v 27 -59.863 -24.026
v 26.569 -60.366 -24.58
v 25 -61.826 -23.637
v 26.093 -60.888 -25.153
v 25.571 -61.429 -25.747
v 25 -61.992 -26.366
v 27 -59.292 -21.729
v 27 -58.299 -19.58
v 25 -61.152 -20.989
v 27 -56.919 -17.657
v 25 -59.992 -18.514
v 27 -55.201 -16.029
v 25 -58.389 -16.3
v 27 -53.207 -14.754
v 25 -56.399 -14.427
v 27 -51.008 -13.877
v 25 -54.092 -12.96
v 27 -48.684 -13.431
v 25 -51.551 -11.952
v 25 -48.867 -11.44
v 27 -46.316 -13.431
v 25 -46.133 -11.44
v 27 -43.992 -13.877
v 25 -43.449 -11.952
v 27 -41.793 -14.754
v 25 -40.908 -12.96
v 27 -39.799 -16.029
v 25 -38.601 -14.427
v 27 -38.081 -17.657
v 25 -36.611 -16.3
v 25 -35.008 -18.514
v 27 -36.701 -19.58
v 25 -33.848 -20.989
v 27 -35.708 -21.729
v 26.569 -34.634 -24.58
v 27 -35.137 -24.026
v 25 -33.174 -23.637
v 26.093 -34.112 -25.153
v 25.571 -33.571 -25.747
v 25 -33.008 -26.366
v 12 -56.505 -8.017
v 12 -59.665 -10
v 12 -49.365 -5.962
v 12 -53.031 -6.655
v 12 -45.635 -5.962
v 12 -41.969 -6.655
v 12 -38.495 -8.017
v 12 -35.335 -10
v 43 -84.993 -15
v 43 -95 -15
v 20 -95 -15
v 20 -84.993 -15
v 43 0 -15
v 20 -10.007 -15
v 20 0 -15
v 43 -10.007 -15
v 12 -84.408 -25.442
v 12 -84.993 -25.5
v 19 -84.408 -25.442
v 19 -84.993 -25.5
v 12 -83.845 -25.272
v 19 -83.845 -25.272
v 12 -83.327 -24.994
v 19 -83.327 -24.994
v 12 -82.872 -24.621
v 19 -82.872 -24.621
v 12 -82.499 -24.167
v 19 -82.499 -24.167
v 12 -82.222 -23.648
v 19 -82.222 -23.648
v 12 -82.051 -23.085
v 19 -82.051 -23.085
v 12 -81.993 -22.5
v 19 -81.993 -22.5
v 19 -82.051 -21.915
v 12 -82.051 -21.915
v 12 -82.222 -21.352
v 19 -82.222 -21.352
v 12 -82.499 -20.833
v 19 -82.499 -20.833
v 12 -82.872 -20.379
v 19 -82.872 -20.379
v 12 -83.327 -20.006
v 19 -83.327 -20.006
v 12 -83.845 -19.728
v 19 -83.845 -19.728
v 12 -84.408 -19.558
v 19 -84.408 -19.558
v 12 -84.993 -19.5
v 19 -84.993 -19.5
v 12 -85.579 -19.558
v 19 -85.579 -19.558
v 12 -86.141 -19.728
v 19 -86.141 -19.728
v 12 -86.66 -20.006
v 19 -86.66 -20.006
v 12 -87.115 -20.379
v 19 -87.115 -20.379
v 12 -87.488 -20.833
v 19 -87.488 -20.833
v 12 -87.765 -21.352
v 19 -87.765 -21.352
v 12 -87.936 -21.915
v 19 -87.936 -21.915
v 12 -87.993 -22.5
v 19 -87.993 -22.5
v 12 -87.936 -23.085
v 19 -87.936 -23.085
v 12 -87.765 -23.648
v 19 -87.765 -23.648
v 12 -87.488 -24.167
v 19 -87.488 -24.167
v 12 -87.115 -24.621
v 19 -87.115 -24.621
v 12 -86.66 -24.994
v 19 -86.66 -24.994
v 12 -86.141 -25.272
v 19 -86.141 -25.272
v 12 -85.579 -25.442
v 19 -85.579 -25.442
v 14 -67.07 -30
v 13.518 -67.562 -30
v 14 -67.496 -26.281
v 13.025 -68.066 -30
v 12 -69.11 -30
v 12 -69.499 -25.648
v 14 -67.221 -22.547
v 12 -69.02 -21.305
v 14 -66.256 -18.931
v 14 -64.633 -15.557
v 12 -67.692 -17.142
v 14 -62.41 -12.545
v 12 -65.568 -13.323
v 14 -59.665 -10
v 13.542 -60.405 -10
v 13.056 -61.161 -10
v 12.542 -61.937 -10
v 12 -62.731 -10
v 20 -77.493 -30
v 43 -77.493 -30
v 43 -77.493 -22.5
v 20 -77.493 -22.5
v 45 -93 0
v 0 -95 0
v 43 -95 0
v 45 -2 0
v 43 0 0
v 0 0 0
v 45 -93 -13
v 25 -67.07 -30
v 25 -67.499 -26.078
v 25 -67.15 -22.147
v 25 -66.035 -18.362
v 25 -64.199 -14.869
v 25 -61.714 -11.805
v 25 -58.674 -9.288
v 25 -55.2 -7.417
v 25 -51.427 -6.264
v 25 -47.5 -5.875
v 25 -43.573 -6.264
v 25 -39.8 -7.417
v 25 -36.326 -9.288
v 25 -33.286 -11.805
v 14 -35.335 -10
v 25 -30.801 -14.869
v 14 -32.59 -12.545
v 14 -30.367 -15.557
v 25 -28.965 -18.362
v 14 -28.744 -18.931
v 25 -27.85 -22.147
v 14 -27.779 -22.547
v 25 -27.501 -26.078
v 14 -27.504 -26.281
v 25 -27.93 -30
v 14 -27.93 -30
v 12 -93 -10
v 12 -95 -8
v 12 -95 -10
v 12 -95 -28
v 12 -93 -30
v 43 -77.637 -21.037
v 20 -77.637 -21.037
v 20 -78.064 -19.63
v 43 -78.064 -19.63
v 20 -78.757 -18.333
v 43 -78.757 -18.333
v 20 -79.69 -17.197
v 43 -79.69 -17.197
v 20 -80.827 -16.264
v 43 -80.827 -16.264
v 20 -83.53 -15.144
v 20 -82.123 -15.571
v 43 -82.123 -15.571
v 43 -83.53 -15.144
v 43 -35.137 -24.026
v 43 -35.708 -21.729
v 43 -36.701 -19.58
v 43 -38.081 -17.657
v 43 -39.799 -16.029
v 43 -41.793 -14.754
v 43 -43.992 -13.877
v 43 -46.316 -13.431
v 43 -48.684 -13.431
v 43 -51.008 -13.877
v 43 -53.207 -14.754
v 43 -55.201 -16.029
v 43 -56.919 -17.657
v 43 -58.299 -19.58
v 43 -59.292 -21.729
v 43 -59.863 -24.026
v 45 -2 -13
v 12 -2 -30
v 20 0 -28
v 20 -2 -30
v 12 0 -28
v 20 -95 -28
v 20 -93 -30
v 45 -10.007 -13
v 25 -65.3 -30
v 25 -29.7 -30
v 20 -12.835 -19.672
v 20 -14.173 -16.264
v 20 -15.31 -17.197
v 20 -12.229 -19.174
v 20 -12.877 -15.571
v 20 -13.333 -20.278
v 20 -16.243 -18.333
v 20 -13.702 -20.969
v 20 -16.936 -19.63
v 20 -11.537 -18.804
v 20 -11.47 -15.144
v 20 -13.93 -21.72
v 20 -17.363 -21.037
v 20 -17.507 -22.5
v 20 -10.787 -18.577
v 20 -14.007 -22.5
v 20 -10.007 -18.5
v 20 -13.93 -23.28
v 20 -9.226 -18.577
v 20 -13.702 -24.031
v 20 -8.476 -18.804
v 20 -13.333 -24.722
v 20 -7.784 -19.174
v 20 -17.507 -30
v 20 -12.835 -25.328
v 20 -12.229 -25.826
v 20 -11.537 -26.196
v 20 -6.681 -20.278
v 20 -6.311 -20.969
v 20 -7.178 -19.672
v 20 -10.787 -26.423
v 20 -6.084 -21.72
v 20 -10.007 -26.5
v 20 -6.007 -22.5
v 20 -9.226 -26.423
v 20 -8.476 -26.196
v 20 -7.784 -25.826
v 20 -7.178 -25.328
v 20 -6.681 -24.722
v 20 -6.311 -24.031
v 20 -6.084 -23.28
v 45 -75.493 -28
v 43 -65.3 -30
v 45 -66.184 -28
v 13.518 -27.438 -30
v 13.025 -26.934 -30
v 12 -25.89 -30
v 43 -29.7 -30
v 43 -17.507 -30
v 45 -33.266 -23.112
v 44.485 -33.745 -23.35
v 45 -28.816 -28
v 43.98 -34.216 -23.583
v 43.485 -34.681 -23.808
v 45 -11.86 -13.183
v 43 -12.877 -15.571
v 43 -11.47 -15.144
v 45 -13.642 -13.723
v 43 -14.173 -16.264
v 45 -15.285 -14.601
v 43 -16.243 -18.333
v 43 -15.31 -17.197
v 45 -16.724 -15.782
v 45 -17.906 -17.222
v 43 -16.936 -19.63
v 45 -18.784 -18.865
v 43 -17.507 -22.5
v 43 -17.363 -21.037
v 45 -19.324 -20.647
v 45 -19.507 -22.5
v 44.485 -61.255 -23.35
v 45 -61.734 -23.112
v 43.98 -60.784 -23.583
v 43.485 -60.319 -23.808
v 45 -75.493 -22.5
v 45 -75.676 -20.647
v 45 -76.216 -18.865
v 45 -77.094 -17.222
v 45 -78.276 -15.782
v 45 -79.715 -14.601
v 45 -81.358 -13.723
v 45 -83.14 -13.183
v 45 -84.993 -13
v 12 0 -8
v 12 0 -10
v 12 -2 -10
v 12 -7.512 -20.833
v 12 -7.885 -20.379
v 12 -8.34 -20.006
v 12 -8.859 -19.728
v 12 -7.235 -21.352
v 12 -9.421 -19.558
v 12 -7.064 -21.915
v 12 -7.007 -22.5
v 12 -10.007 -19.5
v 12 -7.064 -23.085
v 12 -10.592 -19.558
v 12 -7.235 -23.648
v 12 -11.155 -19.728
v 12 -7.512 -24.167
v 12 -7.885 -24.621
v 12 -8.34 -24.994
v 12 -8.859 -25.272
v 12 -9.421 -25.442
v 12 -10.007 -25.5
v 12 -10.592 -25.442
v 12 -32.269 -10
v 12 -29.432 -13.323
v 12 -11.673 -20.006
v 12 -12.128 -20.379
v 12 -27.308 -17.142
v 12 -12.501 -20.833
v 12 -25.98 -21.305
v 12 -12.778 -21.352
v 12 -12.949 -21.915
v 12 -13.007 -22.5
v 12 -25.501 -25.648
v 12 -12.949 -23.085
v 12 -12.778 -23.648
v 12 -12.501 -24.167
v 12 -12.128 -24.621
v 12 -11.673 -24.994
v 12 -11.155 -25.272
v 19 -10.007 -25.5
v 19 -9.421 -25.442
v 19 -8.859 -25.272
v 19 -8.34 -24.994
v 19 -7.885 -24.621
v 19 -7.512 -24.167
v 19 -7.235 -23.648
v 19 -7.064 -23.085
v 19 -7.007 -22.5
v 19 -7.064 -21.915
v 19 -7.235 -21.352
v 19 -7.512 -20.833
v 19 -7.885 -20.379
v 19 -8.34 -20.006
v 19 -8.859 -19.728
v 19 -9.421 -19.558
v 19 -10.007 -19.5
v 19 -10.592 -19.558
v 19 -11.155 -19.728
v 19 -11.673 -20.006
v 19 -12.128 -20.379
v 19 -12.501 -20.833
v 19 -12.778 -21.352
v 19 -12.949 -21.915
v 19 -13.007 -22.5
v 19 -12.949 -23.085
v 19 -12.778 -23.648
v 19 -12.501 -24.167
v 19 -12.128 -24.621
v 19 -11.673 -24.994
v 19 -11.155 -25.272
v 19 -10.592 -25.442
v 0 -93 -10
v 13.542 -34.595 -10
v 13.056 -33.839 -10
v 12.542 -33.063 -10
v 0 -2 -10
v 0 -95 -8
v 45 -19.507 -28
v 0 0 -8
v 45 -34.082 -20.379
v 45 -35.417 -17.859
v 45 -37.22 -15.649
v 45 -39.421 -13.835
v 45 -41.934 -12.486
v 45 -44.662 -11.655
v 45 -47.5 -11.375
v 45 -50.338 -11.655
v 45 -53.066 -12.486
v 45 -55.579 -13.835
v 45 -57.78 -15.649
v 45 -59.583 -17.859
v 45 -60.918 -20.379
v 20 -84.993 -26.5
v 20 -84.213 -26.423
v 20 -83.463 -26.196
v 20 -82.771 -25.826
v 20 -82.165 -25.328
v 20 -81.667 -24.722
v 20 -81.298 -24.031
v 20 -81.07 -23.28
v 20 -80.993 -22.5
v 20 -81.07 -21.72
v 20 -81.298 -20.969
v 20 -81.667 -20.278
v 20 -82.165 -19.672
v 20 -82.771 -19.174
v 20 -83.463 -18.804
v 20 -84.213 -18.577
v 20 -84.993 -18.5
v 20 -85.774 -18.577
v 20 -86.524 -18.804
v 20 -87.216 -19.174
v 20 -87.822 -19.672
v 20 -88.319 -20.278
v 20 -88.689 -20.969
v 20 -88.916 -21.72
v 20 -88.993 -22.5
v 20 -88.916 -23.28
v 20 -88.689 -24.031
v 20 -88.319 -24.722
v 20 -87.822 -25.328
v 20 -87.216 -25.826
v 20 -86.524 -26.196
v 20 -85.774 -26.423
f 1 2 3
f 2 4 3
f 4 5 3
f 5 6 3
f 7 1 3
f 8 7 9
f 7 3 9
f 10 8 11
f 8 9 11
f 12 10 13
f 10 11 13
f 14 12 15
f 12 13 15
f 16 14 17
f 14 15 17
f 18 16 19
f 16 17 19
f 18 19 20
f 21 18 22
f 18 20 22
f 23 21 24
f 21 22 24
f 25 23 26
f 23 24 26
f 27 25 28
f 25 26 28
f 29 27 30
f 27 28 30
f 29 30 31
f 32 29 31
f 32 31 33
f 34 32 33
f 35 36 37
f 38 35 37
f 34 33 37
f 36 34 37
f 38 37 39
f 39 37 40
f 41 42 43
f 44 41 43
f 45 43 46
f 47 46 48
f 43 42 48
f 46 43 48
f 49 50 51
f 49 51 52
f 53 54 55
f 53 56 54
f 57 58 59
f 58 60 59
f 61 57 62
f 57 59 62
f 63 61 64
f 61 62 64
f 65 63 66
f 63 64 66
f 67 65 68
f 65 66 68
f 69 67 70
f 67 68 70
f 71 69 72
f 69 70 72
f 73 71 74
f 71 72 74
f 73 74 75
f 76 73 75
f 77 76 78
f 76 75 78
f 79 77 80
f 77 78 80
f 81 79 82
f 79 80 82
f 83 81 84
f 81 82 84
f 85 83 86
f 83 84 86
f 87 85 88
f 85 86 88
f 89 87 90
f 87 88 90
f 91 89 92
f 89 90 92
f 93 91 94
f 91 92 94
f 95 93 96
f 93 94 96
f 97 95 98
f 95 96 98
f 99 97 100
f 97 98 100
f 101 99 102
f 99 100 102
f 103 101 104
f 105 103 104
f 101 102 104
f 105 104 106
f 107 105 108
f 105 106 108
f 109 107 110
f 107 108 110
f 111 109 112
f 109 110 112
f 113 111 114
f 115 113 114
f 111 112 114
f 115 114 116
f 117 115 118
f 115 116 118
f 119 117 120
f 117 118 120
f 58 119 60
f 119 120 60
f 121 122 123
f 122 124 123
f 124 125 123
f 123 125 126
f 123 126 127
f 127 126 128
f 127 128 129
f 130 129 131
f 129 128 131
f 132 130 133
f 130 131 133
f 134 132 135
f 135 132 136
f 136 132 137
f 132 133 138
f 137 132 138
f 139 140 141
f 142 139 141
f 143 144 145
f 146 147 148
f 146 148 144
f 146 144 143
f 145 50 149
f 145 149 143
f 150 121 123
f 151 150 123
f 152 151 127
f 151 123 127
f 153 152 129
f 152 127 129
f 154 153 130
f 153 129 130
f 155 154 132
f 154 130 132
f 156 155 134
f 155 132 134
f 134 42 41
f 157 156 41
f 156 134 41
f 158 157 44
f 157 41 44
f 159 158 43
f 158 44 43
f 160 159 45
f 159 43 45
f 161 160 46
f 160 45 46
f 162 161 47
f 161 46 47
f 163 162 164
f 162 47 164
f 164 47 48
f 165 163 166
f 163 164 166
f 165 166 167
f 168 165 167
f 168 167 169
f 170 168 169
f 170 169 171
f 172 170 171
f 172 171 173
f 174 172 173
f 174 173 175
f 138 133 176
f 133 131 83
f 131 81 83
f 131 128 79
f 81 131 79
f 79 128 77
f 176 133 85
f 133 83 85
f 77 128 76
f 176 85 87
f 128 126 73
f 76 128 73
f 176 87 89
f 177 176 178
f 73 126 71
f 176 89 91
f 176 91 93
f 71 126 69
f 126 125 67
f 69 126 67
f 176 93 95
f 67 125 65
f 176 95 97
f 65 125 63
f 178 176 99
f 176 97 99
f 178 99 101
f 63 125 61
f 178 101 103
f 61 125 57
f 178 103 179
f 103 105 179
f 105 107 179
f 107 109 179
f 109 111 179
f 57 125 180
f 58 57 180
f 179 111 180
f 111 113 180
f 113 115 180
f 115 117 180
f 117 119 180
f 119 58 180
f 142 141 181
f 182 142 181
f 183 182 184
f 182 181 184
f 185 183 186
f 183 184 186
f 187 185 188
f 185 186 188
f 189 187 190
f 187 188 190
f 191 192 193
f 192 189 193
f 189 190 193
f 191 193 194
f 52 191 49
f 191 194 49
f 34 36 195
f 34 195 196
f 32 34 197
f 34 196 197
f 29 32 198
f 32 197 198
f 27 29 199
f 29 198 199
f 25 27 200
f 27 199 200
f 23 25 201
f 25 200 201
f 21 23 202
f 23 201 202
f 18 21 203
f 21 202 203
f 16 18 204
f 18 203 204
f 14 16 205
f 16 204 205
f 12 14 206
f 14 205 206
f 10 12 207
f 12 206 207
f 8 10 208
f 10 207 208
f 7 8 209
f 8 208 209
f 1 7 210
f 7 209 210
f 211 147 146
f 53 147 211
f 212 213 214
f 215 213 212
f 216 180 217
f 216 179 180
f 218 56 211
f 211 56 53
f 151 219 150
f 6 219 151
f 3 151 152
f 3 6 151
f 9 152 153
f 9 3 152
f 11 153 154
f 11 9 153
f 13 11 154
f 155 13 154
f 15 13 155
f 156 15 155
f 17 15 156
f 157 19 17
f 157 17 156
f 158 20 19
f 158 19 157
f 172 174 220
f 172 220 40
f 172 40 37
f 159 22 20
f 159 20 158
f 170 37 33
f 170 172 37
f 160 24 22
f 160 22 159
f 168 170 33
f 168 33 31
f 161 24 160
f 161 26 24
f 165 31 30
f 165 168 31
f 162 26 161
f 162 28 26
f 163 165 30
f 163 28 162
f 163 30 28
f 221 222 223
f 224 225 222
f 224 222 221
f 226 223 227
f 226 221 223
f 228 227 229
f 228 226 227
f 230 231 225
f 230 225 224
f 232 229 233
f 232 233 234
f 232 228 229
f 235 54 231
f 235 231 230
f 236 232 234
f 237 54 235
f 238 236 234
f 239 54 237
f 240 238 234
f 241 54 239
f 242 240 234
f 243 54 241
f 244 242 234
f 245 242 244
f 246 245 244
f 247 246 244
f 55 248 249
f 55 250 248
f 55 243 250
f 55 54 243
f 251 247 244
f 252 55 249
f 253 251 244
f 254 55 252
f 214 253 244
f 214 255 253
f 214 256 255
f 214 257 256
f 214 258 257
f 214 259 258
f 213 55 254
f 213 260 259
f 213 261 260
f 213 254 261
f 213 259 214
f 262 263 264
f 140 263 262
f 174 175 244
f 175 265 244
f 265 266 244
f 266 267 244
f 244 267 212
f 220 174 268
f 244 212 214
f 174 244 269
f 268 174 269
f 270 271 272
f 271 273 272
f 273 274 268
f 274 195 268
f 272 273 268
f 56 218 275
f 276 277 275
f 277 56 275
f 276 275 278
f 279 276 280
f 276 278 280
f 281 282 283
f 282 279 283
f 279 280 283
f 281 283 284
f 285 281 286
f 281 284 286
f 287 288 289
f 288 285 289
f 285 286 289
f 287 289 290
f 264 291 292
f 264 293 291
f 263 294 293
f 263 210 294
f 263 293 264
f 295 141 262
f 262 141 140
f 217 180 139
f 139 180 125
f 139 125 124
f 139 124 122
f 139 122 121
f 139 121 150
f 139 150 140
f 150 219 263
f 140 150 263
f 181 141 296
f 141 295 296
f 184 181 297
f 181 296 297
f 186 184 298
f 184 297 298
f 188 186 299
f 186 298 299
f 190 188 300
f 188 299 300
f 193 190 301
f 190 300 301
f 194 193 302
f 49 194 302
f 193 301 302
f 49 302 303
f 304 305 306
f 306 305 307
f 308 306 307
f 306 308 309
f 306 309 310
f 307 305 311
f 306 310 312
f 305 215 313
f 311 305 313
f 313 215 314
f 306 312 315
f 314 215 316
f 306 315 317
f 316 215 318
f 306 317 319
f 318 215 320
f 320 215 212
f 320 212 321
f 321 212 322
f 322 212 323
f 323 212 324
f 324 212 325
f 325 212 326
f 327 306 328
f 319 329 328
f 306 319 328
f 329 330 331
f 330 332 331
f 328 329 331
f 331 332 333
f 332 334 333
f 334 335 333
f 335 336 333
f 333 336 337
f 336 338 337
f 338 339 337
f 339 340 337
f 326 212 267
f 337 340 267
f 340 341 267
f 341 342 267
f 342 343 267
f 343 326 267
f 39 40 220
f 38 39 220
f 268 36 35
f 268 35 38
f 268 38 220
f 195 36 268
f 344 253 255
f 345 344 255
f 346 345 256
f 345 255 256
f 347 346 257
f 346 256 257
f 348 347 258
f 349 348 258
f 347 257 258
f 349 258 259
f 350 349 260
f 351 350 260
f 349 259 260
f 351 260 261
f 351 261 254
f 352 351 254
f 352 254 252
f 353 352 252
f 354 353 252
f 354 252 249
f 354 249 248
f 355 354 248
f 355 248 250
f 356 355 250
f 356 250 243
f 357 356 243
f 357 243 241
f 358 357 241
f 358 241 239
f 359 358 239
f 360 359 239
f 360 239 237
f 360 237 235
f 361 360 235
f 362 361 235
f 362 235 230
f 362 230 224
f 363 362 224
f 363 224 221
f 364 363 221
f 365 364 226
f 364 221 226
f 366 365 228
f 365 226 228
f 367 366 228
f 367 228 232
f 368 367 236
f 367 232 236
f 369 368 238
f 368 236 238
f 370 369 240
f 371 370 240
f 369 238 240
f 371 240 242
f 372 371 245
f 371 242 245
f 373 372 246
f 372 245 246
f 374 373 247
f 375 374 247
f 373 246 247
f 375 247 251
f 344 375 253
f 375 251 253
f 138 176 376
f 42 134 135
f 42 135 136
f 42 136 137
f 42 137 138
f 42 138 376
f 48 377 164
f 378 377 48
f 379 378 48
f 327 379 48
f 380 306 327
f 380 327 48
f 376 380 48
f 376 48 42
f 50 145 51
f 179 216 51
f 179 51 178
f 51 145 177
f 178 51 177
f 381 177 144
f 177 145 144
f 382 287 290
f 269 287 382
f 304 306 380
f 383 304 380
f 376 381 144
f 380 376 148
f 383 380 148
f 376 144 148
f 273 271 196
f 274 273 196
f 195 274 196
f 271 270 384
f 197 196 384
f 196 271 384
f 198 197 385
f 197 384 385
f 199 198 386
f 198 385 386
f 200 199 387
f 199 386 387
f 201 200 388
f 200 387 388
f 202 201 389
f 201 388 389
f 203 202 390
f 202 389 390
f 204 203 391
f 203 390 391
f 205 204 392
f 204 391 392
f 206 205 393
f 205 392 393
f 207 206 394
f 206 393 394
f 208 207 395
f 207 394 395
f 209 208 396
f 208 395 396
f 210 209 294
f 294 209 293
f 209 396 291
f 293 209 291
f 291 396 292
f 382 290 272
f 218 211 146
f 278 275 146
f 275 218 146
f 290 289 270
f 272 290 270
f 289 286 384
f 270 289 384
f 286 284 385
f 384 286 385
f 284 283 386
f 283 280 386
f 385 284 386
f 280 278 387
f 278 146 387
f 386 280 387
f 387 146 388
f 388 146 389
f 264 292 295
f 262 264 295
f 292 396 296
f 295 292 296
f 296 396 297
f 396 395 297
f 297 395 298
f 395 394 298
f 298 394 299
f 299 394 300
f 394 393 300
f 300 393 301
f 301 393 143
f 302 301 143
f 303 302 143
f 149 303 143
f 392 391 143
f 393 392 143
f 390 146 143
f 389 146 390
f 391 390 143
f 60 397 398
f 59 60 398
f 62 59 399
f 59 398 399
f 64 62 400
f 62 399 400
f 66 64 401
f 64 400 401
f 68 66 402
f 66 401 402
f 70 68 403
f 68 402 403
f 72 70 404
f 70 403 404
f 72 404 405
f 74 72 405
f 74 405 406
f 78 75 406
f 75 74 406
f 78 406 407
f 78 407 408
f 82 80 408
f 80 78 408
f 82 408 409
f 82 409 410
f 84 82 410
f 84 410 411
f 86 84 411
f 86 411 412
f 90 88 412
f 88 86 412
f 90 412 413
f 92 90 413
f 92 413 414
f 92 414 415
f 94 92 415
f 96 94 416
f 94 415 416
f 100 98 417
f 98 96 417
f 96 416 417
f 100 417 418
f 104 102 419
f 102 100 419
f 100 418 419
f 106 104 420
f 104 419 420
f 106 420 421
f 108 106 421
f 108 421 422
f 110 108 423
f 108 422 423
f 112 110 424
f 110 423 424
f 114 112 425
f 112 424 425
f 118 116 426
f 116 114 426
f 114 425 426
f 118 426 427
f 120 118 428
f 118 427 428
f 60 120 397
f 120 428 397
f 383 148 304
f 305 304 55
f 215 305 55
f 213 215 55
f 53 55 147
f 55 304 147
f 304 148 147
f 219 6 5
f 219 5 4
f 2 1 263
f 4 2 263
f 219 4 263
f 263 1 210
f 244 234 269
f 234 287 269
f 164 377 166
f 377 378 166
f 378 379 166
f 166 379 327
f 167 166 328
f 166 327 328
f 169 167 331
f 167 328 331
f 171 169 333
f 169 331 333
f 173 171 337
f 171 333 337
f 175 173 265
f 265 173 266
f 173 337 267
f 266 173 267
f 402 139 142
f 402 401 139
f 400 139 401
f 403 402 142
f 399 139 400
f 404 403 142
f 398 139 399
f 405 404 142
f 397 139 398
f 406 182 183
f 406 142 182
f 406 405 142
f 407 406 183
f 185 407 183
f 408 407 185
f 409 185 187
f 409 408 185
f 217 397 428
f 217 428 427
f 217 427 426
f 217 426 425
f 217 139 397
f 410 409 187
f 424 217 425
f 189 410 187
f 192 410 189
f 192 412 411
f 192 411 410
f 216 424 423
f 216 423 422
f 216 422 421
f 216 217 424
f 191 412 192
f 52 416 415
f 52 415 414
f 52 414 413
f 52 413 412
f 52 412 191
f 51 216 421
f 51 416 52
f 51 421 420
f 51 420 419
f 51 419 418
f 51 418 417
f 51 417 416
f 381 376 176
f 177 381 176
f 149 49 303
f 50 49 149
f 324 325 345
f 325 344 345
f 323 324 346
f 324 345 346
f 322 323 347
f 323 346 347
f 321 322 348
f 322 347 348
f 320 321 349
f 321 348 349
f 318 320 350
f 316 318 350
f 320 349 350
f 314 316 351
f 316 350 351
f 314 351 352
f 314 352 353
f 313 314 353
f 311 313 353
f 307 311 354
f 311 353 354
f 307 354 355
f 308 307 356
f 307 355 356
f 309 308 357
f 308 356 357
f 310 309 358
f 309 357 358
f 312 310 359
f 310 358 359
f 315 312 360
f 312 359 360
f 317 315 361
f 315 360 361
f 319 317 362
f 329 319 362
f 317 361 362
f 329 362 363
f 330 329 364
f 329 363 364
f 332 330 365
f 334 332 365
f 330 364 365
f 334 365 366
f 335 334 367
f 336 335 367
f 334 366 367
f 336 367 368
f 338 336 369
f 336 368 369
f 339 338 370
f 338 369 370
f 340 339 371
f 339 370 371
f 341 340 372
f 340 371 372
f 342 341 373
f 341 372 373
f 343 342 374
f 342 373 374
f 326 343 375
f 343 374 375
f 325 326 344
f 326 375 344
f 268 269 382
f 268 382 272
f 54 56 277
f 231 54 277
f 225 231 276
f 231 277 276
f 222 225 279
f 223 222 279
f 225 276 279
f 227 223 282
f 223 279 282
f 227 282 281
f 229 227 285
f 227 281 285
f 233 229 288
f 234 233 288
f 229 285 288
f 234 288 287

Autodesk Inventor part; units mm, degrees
ref_plane "YZ Plane" through (0, 0, 0) normal (1, 0, 0) x (0, 1, 0)
ref_plane "XZ Plane" through (0, 0, 0) normal (0, 1, 0) x (-1, 0, 0)
ref_plane "XY Plane" through (0, 0, 0) normal (0, 0, 1) x (1, 0, 0)
sketch "Sketch1" plane through (0, 0, 0) normal (0, 0, 1) x (1, 0, 0)
  line L0 (0, 0) -> (45, 0)
  line L1 (45, 0) -> (45, -95)
  line L2 (45, -95) -> (0, -95)
  line L3 (0, -95) -> (0, 0)
  dimension "d14" = 95
  dimension "d15" = 45
extrude "Extrusion1" add sketch "Sketch1" against normal blind 30
sketch "Sketch2" plane through (0, 0, -30) normal (0, 0, -1) x (-1, 0, 0)
  line L0 (0, -95) -> (0, 0) projected
  line L1 (0, 0) -> (-12, 0)
  line L2 (-12, 0) -> (-12, -95)
  line L3 (-12, -95) -> (0, -95)
  line L4 (0, -95) -> (0, 0)
  line L5 (-45, -95) -> (0, -95) projected
  dimension "d2" = 12
extrude "Extrusion2" cut sketch "Sketch2" against normal blind 20
sketch "Sketch3" plane through (45, -95, 0) normal (1, 0, 0) x (0, 0, -1)
  circle A0 centre (25.875, 47.5) radius 15.621 construction
  circle A1 centre (25.875, 47.5) radius 12.5
  line L0 (0, 0) -> (0, 95) construction
  line L1 (0, 0) -> (30, 0) projected
  line L2 (30, 0) -> (0, 95) construction
  line L3 (30, 95) -> (0, 0) construction
  point P0 (15, 47.5)
  point P1 (10, 95)
  dimension "d5" = 31.242
  dimension "d6" = 25
  dimension "d13" = 15.875
extrude "Extrusion3" cut sketch "Sketch3" against normal through all
sketch "Sketch4" plane through (12, 0, -10) normal (-1, 0, 0) x (0, 0, 1)
  arc A0 (-20, -59.2998) -> (-20, -35.7002) centre (-15.875, -47.5) ccw projected
  circle A1 centre (-15.875, -47.5) radius 20
  point P0 (10, 0)
  dimension "d9" = 40
extrude "Extrusion4" cut sketch "Sketch4" against normal blind 13
sketch "Sketch5" plane through (45, -95, 0) normal (1, 0, 0) x (0, 0, -1)
  arc A0 (15, 84.9933) -> (22.5, 77.4933) centre (22.5, 84.9933) ccw
  circle A1 centre (22.5, 84.9933) radius 2.5 construction
  line L0 (22.5, 77.4933) -> (30, 77.4933)
  line L1 (30, 95) -> (30, 59.2998) projected
  line L2 (15, 84.9933) -> (15, 95)
  line L3 (0, 95) -> (30, 95) projected
  point P0 (15.0002, 95)
  dimension "d17" = 15
extrude "Extrusion5" cut sketch "Sketch5" against normal blind 25
sketch "Sketch6" plane through (20, -95, 0) normal (1, 0, 0) x (0, 0, -1)
  arc A0 (15, 84.9933) -> (22.5, 77.4933) centre (22.5, 84.9933) ccw projected
  circle A1 centre (22.5, 84.9933) radius 3
  point P0 (0, 95)
  point P1 (15.0002, 95)
  dimension "d20" = 6
extrude "Extrusion6" cut sketch "Sketch6" against normal through all
ref_plane "Work Plane1" through (0, -47.5, 0) normal (0, 1, 0) x (1, 0, 0)
mirror "Mirror1" about plane through (0, -47.5, 0) normal (0, 1, 0) of "Extrusion5", "Extrusion6"
chamfer "Chamfer3" distance 6 angle 45 2 edges at (35, -59.2998, -30) (35, -35.7002, -30)
chamfer "Chamfer1" distance 2 angle 45 20 edges at (45, -5.0033, -15) (45, -15.31, -17.1967) (45, -17.5067, -26.25) (45, -89.9967, -15) (45, -79.69, -17.1967) (45, -77.4933, -26.25) (16, 0, -30) (16, -95, -30) (45, 0, -7.5) (6, 0, -10) (45, -95, -7.5) (6, -95, -10) (45, -23.6034, -30) (45, -47.5, -13.375) (45, -71.3966, -30) (25, -47.5, -13.375) (12, -28.7443, -18.9306) (12, -66.2557, -18.9306) (45, -32.4188, -27.0132) (45, -62.5812, -27.0132)
chamfer "Chamfer2" distance 1 angle 45 2 edges at (20, -10.0067, -19.5) (20, -84.9933, -19.5)
properties part number "pillar_placer"
